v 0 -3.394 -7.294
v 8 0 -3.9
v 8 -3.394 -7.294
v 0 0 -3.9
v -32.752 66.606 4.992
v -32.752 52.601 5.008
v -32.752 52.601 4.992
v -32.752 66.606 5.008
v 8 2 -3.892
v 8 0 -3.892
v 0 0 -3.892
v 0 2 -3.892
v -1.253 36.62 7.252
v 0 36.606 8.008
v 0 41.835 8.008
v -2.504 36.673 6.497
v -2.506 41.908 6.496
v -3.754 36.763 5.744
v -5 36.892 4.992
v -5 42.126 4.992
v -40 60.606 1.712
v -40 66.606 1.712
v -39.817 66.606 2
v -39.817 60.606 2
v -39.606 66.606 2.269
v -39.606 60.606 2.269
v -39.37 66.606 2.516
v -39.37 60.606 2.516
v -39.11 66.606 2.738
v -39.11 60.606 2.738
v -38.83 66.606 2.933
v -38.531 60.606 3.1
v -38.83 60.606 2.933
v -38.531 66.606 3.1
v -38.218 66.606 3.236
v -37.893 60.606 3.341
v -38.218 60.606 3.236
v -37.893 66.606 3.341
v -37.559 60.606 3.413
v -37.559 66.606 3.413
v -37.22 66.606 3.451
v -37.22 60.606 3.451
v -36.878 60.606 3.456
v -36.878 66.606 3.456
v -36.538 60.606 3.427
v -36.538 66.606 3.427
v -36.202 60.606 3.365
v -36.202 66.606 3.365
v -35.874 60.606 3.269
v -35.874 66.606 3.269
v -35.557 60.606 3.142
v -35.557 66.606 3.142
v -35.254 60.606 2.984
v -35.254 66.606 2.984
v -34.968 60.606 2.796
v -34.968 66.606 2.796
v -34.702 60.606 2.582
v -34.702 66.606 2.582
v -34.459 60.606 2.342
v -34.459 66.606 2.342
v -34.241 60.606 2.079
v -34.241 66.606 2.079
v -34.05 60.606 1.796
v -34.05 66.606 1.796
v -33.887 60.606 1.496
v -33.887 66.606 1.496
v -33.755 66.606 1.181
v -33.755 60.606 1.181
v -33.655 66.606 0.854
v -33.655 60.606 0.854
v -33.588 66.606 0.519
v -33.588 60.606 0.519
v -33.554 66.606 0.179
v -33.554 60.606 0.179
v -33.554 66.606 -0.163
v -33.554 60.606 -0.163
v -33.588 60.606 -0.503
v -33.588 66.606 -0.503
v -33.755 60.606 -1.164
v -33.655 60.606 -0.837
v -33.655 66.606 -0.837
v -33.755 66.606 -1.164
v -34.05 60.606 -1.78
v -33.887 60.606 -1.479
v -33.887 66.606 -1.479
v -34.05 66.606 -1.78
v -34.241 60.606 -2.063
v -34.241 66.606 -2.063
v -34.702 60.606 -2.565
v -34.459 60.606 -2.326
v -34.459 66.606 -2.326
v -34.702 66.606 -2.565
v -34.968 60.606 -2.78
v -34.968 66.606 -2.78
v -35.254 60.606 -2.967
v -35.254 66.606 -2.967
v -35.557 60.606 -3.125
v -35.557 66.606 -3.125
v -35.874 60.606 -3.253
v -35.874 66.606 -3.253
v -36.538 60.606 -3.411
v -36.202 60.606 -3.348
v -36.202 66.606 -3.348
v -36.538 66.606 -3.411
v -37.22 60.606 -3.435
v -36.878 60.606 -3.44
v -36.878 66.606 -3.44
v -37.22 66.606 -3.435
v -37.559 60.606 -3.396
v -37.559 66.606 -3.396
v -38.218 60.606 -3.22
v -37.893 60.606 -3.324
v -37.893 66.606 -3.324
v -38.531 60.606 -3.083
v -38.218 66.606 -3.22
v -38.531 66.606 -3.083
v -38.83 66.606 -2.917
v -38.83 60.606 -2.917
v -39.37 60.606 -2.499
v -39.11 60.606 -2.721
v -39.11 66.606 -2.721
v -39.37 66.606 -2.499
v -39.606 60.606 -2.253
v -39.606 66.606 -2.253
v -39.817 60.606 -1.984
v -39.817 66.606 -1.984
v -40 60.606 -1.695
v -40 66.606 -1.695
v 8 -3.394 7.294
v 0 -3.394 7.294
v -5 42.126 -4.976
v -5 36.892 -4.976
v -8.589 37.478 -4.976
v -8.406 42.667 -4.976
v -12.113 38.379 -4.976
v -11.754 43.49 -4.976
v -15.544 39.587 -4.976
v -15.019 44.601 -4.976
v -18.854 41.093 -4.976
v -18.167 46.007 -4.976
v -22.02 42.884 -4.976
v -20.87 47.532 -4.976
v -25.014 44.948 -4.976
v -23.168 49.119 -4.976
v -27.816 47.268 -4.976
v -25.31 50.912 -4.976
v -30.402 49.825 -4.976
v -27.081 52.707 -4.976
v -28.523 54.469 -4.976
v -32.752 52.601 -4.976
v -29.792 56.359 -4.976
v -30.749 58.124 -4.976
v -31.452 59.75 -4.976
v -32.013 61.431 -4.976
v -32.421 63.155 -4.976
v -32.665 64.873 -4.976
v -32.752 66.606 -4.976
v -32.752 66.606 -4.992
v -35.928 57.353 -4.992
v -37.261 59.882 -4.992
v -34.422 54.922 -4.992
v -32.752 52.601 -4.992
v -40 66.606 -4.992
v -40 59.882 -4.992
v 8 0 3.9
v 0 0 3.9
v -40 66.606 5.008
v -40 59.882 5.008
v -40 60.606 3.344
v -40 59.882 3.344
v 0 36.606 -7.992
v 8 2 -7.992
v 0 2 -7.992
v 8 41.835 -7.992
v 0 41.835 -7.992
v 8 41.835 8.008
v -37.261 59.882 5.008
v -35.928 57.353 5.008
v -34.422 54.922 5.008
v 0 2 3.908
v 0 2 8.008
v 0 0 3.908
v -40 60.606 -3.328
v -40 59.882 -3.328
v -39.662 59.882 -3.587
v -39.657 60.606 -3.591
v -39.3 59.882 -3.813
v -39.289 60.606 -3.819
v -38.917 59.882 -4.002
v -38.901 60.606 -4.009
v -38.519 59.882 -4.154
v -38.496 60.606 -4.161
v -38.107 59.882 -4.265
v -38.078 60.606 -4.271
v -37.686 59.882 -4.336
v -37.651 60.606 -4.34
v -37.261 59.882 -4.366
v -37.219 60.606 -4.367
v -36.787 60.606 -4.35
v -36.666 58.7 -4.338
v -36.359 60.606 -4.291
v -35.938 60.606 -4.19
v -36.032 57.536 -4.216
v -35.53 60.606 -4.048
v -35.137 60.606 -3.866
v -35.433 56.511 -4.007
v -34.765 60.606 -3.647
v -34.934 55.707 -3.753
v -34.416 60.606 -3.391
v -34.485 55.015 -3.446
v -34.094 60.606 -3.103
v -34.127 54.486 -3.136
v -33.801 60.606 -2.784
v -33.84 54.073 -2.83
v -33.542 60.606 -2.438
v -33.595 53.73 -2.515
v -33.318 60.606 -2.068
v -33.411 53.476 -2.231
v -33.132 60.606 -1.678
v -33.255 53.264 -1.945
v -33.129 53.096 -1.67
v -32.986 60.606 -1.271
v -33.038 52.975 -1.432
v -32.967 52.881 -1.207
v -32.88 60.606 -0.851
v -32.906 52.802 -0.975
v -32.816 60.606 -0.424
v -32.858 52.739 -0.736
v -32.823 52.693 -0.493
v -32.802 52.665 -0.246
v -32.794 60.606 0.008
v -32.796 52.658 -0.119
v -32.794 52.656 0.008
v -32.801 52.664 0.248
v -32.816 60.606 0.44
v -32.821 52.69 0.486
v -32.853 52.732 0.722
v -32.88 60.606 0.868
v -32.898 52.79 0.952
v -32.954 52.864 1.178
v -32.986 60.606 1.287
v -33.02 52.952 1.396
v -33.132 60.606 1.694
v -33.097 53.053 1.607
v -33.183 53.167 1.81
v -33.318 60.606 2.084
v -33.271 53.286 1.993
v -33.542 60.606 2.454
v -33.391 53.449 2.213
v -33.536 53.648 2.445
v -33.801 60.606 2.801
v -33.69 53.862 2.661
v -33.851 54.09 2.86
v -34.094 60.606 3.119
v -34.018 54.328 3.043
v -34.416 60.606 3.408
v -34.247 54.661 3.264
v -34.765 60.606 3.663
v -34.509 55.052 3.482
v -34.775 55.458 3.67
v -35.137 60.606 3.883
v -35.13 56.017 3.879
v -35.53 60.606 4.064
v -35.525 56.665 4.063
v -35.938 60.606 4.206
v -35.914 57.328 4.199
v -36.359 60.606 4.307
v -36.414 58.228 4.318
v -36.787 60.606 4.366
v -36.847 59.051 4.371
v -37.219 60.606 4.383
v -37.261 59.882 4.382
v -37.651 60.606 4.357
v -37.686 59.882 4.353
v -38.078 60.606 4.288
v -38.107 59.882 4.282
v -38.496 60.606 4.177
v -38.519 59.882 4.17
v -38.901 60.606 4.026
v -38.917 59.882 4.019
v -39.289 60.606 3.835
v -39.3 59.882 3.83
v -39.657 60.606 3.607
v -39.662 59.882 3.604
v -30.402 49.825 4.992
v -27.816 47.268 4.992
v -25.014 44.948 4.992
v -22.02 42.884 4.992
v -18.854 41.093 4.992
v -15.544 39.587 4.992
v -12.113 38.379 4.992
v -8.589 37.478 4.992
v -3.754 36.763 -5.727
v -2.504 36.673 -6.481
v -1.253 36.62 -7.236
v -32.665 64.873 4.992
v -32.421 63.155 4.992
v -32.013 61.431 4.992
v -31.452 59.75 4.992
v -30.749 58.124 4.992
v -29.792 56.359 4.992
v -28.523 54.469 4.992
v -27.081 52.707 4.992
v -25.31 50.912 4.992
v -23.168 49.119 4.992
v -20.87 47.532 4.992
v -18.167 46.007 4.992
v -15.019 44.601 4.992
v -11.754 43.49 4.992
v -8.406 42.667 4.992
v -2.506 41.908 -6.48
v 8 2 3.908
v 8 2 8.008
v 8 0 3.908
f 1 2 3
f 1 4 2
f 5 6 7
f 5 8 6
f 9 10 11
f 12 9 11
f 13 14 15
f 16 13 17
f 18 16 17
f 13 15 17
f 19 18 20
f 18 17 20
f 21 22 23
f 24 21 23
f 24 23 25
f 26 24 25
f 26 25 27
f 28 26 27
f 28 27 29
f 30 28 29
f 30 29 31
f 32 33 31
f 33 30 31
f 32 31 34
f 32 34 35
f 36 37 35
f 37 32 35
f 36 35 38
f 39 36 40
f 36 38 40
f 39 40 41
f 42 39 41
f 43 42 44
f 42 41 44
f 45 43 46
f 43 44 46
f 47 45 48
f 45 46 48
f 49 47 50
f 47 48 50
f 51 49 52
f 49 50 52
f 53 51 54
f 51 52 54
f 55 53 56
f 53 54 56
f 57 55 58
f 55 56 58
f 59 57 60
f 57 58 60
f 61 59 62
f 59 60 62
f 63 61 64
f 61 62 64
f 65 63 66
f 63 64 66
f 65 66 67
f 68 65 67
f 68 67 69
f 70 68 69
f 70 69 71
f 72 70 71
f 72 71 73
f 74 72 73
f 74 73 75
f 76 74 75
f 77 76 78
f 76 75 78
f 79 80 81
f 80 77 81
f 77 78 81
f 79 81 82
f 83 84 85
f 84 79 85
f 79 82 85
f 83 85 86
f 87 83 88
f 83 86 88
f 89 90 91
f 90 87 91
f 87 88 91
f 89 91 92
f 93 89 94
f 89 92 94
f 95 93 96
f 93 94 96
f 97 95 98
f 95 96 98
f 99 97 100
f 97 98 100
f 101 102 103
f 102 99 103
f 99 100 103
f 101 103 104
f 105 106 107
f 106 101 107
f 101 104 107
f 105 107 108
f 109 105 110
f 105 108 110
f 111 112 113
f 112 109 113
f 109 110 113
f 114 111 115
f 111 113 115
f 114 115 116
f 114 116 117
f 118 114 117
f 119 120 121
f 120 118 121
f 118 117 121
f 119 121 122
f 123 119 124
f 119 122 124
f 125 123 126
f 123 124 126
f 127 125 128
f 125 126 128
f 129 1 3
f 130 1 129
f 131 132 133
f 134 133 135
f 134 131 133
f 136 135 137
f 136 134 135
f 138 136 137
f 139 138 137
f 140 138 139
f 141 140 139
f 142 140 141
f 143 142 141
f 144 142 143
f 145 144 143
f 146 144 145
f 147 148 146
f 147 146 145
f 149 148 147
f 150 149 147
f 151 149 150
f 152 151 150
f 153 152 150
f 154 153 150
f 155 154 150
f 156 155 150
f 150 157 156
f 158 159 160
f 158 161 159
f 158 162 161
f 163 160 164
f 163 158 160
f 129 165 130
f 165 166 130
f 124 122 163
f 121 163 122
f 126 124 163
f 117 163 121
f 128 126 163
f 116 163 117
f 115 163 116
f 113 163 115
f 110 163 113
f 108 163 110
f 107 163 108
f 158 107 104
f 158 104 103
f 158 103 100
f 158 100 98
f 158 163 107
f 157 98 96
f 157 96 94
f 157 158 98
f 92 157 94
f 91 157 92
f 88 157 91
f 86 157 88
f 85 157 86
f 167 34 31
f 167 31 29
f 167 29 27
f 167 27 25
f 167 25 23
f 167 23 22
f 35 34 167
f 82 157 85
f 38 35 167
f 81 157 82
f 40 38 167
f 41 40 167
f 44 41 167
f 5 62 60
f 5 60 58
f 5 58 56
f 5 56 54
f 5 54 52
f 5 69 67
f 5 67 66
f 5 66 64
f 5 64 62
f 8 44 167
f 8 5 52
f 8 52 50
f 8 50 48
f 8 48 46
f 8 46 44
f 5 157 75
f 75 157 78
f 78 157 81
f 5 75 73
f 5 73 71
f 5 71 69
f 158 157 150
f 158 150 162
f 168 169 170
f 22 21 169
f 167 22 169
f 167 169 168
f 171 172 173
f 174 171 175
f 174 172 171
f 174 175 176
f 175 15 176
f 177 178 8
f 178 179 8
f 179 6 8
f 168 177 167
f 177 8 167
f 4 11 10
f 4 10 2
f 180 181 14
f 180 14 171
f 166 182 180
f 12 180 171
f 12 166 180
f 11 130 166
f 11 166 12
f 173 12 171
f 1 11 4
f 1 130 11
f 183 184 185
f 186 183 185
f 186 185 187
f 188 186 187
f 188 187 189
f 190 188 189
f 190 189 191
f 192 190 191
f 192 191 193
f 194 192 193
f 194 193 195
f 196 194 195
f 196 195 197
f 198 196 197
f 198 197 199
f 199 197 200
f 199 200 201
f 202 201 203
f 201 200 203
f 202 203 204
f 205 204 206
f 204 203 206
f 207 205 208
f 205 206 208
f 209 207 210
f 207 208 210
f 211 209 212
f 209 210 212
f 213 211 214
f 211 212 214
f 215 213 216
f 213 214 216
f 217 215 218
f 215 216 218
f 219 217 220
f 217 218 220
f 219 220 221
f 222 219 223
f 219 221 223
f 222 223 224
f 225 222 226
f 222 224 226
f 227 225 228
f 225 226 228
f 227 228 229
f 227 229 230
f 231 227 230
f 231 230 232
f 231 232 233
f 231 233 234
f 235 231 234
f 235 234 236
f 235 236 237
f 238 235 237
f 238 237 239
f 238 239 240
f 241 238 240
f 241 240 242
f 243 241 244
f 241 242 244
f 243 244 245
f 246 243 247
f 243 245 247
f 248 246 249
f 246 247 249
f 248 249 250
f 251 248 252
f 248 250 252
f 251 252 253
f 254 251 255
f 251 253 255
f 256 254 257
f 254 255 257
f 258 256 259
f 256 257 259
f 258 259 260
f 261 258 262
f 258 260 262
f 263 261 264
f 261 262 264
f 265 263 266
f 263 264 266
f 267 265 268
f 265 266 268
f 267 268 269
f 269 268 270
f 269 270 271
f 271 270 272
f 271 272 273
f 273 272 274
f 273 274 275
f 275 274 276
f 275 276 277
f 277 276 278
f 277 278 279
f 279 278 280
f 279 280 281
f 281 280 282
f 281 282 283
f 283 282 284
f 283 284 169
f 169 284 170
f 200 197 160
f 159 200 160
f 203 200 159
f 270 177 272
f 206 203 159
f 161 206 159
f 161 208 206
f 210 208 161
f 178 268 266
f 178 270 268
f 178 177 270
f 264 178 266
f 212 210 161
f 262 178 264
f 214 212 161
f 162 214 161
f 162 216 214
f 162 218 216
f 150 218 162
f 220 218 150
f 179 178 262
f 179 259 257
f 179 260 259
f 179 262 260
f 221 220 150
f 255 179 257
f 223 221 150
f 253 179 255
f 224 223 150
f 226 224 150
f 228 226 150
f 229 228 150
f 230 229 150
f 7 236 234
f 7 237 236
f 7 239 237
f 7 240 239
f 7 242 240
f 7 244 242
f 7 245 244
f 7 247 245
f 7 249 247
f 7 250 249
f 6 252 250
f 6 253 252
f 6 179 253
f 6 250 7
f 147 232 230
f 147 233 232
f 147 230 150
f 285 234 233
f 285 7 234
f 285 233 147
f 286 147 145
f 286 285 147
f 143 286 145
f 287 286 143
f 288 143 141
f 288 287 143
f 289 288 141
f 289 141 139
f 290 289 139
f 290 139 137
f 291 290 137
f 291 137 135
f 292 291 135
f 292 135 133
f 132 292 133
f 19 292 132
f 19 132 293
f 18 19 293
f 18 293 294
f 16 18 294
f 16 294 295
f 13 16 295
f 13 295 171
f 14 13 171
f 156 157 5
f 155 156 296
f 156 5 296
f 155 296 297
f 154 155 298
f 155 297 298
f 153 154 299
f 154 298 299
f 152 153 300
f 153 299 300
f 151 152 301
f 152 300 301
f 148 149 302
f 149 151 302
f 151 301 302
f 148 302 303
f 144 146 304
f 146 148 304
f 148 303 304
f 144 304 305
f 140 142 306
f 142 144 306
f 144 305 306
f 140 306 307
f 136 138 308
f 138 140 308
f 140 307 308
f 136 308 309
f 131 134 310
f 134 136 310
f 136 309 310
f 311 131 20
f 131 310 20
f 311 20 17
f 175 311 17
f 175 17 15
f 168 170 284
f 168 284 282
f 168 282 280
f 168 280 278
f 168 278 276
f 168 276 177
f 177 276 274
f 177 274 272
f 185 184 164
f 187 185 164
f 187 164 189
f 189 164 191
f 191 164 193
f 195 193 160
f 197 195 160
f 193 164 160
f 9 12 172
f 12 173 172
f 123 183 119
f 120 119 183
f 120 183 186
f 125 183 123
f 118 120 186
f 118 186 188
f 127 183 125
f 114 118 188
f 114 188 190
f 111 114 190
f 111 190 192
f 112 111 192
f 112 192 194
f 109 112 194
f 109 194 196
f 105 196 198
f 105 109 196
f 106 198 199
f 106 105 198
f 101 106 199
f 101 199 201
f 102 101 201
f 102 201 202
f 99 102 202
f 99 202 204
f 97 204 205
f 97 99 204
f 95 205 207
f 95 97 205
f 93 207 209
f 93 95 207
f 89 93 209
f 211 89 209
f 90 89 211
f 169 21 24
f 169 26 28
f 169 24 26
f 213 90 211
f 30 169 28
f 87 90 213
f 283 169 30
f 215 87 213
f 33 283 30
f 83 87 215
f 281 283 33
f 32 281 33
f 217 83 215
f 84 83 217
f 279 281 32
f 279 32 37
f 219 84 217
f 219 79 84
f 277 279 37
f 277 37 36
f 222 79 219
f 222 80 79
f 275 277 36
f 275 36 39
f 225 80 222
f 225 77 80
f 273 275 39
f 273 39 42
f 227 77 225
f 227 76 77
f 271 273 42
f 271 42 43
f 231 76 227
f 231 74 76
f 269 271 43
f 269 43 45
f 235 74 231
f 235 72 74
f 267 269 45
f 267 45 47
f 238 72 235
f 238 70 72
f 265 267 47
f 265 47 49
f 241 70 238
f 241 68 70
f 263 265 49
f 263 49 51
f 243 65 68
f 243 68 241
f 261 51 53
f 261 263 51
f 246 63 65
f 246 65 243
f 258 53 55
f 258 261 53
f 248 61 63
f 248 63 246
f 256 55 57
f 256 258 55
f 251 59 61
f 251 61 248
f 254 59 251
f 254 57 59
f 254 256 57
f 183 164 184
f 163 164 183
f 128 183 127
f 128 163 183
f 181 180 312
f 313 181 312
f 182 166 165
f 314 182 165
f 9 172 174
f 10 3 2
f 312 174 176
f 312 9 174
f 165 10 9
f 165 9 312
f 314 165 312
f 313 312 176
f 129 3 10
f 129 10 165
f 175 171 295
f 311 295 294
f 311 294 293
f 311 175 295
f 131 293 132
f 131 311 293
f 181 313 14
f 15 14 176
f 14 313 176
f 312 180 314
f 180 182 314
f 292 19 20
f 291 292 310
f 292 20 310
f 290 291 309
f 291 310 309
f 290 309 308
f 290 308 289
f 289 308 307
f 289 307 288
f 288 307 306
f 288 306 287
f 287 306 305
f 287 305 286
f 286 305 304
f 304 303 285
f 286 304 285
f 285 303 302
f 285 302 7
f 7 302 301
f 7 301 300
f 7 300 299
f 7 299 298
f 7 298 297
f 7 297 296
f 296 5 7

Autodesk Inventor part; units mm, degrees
ref_plane "YZ Plane" through (0, 0, 0) normal (1, 0, 0) x (0, 1, 0)
ref_plane "XZ Plane" through (0, 0, 0) normal (0, 1, 0) x (-1, 0, 0)
ref_plane "XY Plane" through (0, 0, 0) normal (0, 0, 1) x (1, 0, 0)
sketch "Sketch1" plane through (0, 0, 0) normal (1, 0, 0) x (0, 1, 0)
  line L0 (0, 0) -> (0, 3.9)
  line L1 (0, 0) -> (0, -3.9)
  line L2 (0, 3.9) -> (-3.3941, 7.2941)
  line L3 (0, 3.9) -> (4.8, 3.9) construction
  line L4 (0, -3.9) -> (-3.3941, -7.2941)
  line L5 (0, -3.9) -> (4.8, -3.9) construction
  line L6 (-3.3941, -7.2941) -> (-3.3941, 7.2941)
  dimension "d0" = 3.9
  dimension "d1" = 3.9
  dimension "d2" = 4.8
  dimension "d3" = 135
  dimension "d4" = 4.8
  dimension "d5" = 135
extrude "Extrusion1" add sketch "Sketch1" along normal blind 8
sketch "Sketch2" plane through (0, 0, 3.9) normal (0, 1, 0) x (1, 0, 0)
  line L0 (0, -3.3941) -> (0, 11.1941) projected
  line L1 (0, -0.0082) -> (8, -0.0082)
  line L2 (8, -0.0082) -> (8, 7.7918)
  line L3 (8, 7.7918) -> (0, 7.7918)
  line L4 (0, 7.7918) -> (0, -0.0082)
  point P0 (0, 3.9)
  dimension "d8" = 8
  dimension "d9" = 7.8
extrude "Extrusion2" add sketch "Sketch2" along normal blind 2
sketch "Sketch3" plane through (0, 2, 3.9) normal (0, 1, 0) x (1, 0, 0)
  line L0 (8, -4.1082) -> (0, -4.1082)
  line L1 (0, -4.1082) -> (0, 11.8918)
  line L2 (0, 11.8918) -> (8, 11.8918)
  line L3 (8, 11.8918) -> (8, -4.1082)
  line L4 (8, -4.1082) -> (0, 11.8918) construction
  line L5 (0, -4.1082) -> (8, 11.8918) construction
  line L6 (8, 7.7918) -> (0, 7.7918) projected
  point P0 (0, 3.9)
  point P1 (4, 3.8918)
  dimension "d12" = 8
  dimension "d13" = 16
  dimension "d14" = 3.9
  dimension "d15" = 4
extrude "Extrusion3" add sketch "Sketch3" along normal blind 64.606
sketch "Sketch4" plane through (0, 0, 0) normal (-1, 0, 0) x (0, 0, 1)
  line L0 (-7.9918, 2) -> (-7.9918, 66.606) projected
  line L1 (8.0082, 2) -> (8.0082, 66.606) projected
  line L2 (-7.9918, 66.606) -> (8.0082, 66.606)
  line L3 (8.0082, 66.606) -> (8.0082, 36.606)
  line L4 (8.0082, 36.606) -> (-7.9918, 36.606)
  line L5 (-7.9918, 36.606) -> (-7.9918, 66.606)
  point P0 (0, 0)
  point P1 (8.0082, 66.606)
  point P2 (-7.9918, 36.606)
  dimension "d18" = 30
extrude "Extrusion4" add sketch "Sketch4" along normal blind 40
sketch "Sketch5" plane through (0, 66.606, 3.9) normal (0, 1, 0) x (1, 0, 0)
  circle A0 centre (-37, 3.8918) radius 3.45
  line L0 (-40, -4.1082) -> (-40, 11.8918) projected
  line L1 (8, 11.8918) -> (-40, 11.8918) projected
  point P0 (0, 3.9)
  point P1 (-40, 5.5955)
  point P2 (-40, 2.1882)
  dimension "d21" = 6.9
  dimension "d22" = 3
  dimension "d53" = 8
sketch "Sketch6" plane through (0, 2, 8.0082) normal (0, 0, 1) x (1, 0, 0)
  point P0 (0, -2)
sketch "Sketch7" plane through (0, 2, 8.0082) normal (0, 0, 1) x (1, 0, 0)
  point P0 (0, -2)
sketch "Sketch10" plane through (0, 2, 8.0082) normal (0, 0, 1) x (1, 0, 0)
  ellipse E0 centre (0, 64.6805) end of major axis (0, 39.8349) minor radius 32.7521
  line L0 (8, 64.606) -> (-40, 64.606) projected
  line L1 (0, 39.8349) -> (8, 39.8349)
  line L2 (8, 39.8349) -> (8, 64.606)
  line L3 (8, 64.606) -> (0, 64.606)
  line L4 (0, 64.606) -> (0, 39.8349)
  point P0 (0, -2)
  point P1 (8, 40.5875)
extrude "Extrusion8" cut sketch "Sketch10" against normal through all
sketch "Sketch13" plane through (0, 36.606, -7.9918) normal (0, -1, 0) x (1, 0, 0)
  circle A0 centre (-37.1694, 8) radius 4.375
  line L0 (0, 16) -> (-40, 16) projected
  point P0 (0, 7.9918)
  dimension "d37" = 8.75
  dimension "d46" = 8
extrude "Extrusion9" cut sketch "Sketch13" against normal blind 24
extrude "Extrusion10" cut sketch "Sketch5" against normal blind 24
sketch "Sketch14" plane through (8, 2, -7.9918) normal (0, 0, -1) x (-1, 0, 0)
  line L0 (48, 34.606) -> (40.7944, 34.606) projected
  line L1 (45.2609, 34.606) -> (48, 34.606)
  line L2 (48, 34.606) -> (48, 57.8825)
  line L3 (48, 57.8825) -> (45.2609, 57.8825)
  line L4 (45.2609, 57.8825) -> (45.2609, 34.606)
  point P0 (8, -2)
extrude "Extrusion11" cut sketch "Sketch14" against normal blind 24
sketch "Sketch15" plane through (0, 2, 8.0082) normal (0, 0, 1) x (1, 0, 0)
  line L0 (-37.2609, 57.8825) -> (-37.2609, 34.606) projected
  line L1 (0, 34.606) -> (-37.2609, 34.606) projected
  arc A0 (-37.2609, 57.8825) -> (0, 34.606) centre (-0.1523, 75.824) ccw
  point P0 (0, -2)
  point P1 (-0.3046, 34.606)
extrude "Extrusion12" cut sketch "Sketch15" against normal through all
sketch "Sketch16" plane through (0, 66.606, 3.9) normal (0, 1, 0) x (1, 0, 0)
  line L0 (-40, 5.5955) -> (-40, 11.8918) projected
  line L1 (-32.752, 11.8918) -> (-40, 11.8918) projected
  line L2 (-32.752, -4.1082) -> (-32.752, 11.8918) projected
  line L3 (-40, 11.8918) -> (-32.752, 11.8918)
  line L4 (-32.752, 11.8918) -> (-32.752, 8.8918)
  line L5 (-32.752, 8.8918) -> (-40, 8.8918)
  line L6 (-40, 8.8918) -> (-40, 11.8918)
  line L7 (0, 11.8918) -> (0, 7.7918) projected
  line L8 (0, 11.8918) -> (-5, 11.8918)
  line L9 (-5, 11.8918) -> (-5, 8.8755)
  line L10 (-5, 8.8755) -> (0, 8.8755)
  line L11 (0, 8.8755) -> (0, 11.8918)
  line L12 (-5, 8.8755) -> (-32.752, 8.8755)
  line L13 (-32.752, 8.8755) -> (-32.752, 11.8918)
  line L14 (-32.752, 11.8918) -> (-5, 11.8918)
  line L15 (-5, 11.8918) -> (-5, 8.8755)
  line L16 (0, 11.8918) -> (-5, 8.8755)
  line L17 (0, 3.8918) -> (-40, 3.8918)
  line L18 (-40, 2.1882) -> (-40, -4.1082)
  line L19 (-32.752, -4.1082) -> (-40, -4.1082)
  line L20 (-32.752, 11.8918) -> (-32.752, -4.1082)
  line L21 (-40, -4.1082) -> (-32.752, -4.1082)
  line L22 (-32.752, -4.1082) -> (-32.752, -1.1082)
  line L23 (-32.752, -1.1082) -> (-40, -1.1082)
  line L24 (-40, -1.1082) -> (-40, -4.1082)
  line L25 (0, -4.1082) -> (0, -0.0082)
  line L26 (0, -4.1082) -> (-5, -4.1082)
  line L27 (-5, -4.1082) -> (-5, -1.0918)
  line L28 (-5, -1.0918) -> (0, -1.0918)
  line L29 (0, -1.0918) -> (0, -4.1082)
  line L30 (-5, -1.0918) -> (-32.752, -1.0918)
  line L31 (-32.752, -1.0918) -> (-32.752, -4.1082)
  line L32 (-32.752, -4.1082) -> (-5, -4.1082)
  line L33 (-5, -4.1082) -> (-5, -1.0918)
  line L34 (0, -4.1082) -> (-5, -1.0918)
  point P0 (0, -1.0918)
  dimension "d48" = 3
  dimension "d49" = 5
  dimension "d52" = 8
extrude "Extrusion13" cut sketch "Sketch16" against normal through all contours L30 L27 L32 L2 | L0 L1 L2 L5 | L2 L14 L9 L12 | L8 L16 L9 | L2 L19 L18 L23 | L34 L26 L27
properties part number "Pasteur_holder_V2"
